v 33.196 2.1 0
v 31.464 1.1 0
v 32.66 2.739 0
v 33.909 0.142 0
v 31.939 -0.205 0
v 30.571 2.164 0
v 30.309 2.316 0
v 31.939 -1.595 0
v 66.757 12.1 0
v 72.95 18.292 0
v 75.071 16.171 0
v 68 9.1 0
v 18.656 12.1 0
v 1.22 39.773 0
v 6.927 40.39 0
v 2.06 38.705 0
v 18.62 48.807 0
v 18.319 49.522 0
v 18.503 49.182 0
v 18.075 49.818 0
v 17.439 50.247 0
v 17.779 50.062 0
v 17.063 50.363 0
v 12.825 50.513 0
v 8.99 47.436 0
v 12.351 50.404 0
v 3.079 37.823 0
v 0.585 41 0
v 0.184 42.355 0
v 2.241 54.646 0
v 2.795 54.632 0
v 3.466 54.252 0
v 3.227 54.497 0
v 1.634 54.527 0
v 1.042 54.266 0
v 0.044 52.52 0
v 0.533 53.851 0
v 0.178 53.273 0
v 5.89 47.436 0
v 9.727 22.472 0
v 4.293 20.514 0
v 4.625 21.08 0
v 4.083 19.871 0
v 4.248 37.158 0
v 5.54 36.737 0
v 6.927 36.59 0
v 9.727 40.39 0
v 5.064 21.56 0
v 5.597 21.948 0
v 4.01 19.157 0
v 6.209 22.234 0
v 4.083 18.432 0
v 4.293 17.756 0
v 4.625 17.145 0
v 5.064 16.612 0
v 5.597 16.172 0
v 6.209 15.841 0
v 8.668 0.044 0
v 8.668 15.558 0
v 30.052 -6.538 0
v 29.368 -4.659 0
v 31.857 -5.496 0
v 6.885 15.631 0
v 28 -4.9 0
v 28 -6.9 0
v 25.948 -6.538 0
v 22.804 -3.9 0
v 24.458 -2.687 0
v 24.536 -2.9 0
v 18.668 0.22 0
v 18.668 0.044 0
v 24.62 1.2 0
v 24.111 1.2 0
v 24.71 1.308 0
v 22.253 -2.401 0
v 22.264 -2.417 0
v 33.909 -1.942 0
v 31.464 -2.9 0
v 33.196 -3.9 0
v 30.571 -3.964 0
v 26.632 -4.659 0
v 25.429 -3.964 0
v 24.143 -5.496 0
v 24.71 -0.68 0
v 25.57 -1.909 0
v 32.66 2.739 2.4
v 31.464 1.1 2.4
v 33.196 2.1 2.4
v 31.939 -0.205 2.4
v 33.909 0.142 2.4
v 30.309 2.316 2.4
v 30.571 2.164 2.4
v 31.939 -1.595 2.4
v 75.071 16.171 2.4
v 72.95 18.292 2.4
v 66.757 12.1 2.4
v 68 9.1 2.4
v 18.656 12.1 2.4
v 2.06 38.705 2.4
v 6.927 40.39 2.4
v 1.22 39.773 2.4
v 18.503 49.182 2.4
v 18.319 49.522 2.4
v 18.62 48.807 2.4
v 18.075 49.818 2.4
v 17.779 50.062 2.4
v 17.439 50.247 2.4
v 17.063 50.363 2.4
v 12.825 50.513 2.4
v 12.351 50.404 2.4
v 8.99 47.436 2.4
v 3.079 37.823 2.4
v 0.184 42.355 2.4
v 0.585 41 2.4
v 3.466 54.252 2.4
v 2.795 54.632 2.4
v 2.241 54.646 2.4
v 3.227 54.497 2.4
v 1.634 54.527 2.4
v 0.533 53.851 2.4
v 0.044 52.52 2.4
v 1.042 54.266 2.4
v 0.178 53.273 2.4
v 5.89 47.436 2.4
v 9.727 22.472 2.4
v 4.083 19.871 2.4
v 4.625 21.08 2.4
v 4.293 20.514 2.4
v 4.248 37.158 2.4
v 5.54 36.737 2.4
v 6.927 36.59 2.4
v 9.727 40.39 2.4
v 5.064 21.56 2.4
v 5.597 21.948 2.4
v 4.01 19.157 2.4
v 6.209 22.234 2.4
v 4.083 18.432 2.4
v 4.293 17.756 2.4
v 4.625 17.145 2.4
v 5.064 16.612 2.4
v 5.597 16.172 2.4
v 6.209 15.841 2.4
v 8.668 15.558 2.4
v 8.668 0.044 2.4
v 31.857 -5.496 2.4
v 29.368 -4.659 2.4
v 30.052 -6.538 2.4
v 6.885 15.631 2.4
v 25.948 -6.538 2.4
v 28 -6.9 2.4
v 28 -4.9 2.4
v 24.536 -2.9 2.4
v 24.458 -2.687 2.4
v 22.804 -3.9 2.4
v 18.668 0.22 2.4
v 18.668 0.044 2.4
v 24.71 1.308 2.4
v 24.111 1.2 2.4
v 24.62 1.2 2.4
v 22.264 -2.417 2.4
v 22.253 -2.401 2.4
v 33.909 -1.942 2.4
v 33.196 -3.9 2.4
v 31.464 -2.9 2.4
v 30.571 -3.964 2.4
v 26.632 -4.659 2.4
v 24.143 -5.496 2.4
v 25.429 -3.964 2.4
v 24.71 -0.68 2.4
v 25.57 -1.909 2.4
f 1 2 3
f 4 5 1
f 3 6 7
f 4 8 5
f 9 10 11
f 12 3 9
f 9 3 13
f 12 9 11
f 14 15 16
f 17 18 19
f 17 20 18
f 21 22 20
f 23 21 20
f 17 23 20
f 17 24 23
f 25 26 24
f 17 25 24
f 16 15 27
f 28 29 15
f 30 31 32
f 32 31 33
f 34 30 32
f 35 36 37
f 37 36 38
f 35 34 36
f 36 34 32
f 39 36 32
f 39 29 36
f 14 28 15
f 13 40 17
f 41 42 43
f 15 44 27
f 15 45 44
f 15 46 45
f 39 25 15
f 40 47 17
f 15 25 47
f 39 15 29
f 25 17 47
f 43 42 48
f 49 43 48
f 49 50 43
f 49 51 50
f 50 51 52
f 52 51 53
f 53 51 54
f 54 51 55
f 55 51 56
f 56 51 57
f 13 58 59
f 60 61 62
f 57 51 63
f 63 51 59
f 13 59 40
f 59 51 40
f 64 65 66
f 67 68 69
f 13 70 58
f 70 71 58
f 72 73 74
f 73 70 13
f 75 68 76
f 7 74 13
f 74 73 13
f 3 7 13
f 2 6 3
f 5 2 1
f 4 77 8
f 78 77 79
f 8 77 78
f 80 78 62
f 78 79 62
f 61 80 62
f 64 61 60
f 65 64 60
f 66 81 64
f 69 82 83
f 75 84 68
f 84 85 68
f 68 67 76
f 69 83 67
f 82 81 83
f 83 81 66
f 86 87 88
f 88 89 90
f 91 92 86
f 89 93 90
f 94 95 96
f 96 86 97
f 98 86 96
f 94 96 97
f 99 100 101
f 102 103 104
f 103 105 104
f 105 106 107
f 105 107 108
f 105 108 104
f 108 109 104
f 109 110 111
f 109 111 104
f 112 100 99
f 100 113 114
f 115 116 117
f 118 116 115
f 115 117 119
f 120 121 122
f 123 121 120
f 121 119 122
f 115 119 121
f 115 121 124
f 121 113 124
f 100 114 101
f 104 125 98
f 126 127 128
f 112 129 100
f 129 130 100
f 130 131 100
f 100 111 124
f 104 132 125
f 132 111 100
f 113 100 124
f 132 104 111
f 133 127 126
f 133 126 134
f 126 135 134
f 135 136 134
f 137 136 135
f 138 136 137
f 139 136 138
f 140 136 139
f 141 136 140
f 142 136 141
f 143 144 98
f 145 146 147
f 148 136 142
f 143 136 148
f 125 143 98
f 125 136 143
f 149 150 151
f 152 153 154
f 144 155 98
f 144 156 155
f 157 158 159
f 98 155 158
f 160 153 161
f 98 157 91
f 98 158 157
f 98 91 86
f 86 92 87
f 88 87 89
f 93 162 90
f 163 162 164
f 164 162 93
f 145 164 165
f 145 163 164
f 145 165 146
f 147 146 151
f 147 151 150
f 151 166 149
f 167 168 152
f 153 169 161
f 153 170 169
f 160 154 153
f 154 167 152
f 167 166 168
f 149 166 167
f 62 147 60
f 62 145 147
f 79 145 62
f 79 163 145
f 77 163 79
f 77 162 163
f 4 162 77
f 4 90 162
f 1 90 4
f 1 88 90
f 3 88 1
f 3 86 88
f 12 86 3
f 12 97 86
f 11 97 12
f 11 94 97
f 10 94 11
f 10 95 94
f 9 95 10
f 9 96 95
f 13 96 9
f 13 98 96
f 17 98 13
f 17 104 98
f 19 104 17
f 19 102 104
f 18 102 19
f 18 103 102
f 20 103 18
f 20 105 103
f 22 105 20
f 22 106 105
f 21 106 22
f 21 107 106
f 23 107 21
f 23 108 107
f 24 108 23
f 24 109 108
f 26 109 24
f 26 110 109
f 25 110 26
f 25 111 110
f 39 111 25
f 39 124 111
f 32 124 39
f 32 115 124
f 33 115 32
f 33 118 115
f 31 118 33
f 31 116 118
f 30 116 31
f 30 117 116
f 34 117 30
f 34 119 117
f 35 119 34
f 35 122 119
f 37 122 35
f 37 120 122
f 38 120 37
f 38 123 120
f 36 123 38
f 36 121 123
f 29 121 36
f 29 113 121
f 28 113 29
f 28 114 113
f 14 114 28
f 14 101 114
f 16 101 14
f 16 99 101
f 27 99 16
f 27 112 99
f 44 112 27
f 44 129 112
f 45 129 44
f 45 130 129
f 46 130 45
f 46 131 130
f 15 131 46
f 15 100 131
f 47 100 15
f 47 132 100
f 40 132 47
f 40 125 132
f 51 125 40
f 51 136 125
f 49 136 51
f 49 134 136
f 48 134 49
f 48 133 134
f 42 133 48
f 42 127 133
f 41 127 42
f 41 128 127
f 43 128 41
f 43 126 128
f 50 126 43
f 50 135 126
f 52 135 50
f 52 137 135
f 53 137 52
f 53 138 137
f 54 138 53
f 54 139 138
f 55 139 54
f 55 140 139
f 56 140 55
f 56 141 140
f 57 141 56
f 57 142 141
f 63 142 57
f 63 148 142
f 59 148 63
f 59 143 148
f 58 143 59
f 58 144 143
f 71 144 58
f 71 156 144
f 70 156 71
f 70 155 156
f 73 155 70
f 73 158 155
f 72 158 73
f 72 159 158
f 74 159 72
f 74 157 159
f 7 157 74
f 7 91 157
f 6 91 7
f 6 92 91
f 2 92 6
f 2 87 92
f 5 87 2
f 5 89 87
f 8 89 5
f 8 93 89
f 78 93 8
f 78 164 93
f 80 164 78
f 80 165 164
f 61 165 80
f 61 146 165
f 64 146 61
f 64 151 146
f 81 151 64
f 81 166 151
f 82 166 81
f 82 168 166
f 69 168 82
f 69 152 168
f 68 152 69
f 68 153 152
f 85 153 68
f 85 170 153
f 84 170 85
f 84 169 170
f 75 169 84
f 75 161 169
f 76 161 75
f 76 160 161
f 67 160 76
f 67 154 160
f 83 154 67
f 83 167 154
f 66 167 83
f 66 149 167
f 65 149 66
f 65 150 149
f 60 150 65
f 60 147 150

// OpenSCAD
// Total Boundary is width=18.712553  height=54.690030

// Layer 2 :: <Path>
//      width=18.712553  height=54.690030



hook_to_hook = 37.9 - 12.8;
hook_thick = 3;

linear_extrude(height=2.4)
union() {

polygon(points=[[18.668456,0.044097], [18.619535,48.807012], [18.503091,49.182355], [18.318778,49.522214], [18.074521,49.818148], [17.778588,50.062405], [17.438557,50.246718], [17.063041,50.363334], [12.825229,50.513368], [12.350840,50.403986], [8.989977,47.435692], [5.889563,47.435692], [3.466455,54.251641], [3.226504,54.497449], [2.795178,54.632324], [2.241379,54.645760], [1.633837,54.526904], [1.041625,54.265594], [0.533301,53.850977], [0.177939,53.272717], [0.044097,52.519964], [0.183968,42.355382], [0.584977,40.999909], [1.219564,39.773455], [2.059995,38.704959], [3.078537,37.823359], [4.247630,37.157594], [5.539541,36.736948], [6.926709,36.590187], [6.926709,40.390127], [9.726710,40.390127], [9.726710,22.472358], [6.208751,22.233957], [5.597247,21.947670], [5.064463,21.560441], [4.624868,21.080195], [4.292933,20.514166], [4.083299,19.870622], [4.010091,19.157142], [4.083299,18.431605], [4.292933,17.756022], [4.624868,17.144518], [5.064463,16.611906], [5.597247,16.172312], [6.208751,15.840549], [6.884507,15.630743], [8.668377,15.557707], [8.668377,0.044097], [18.668456,0.044097], ], paths=[0:49]);



rotate([0,180,90]) translate([-75.4,-18,0])
union() {
    translate([hook_to_hook*3 - hook_thick*4, 0])
        polygon(points = [ [0, 0],
                           [0, -50],
                           [hook_thick, -50],
                           [hook_thick*4, 0] ],
                path = [ [0:3] ]);

    translate([hook_to_hook*3 - hook_thick*3, -50])
        rotate(135) square([hook_thick, 10]);

    // add cable hook
    translate([hook_to_hook*3+1, -10]) difference()
    {
        circle(6, $fn=18);
        circle(4, $fn=18);
        translate([-2.1,0]) square([3.6,7]);

    }
    translate([hook_to_hook*3+1 - 0.22,-10 + 3.29]) rotate(-35) square([1.5,3]);
}

}
